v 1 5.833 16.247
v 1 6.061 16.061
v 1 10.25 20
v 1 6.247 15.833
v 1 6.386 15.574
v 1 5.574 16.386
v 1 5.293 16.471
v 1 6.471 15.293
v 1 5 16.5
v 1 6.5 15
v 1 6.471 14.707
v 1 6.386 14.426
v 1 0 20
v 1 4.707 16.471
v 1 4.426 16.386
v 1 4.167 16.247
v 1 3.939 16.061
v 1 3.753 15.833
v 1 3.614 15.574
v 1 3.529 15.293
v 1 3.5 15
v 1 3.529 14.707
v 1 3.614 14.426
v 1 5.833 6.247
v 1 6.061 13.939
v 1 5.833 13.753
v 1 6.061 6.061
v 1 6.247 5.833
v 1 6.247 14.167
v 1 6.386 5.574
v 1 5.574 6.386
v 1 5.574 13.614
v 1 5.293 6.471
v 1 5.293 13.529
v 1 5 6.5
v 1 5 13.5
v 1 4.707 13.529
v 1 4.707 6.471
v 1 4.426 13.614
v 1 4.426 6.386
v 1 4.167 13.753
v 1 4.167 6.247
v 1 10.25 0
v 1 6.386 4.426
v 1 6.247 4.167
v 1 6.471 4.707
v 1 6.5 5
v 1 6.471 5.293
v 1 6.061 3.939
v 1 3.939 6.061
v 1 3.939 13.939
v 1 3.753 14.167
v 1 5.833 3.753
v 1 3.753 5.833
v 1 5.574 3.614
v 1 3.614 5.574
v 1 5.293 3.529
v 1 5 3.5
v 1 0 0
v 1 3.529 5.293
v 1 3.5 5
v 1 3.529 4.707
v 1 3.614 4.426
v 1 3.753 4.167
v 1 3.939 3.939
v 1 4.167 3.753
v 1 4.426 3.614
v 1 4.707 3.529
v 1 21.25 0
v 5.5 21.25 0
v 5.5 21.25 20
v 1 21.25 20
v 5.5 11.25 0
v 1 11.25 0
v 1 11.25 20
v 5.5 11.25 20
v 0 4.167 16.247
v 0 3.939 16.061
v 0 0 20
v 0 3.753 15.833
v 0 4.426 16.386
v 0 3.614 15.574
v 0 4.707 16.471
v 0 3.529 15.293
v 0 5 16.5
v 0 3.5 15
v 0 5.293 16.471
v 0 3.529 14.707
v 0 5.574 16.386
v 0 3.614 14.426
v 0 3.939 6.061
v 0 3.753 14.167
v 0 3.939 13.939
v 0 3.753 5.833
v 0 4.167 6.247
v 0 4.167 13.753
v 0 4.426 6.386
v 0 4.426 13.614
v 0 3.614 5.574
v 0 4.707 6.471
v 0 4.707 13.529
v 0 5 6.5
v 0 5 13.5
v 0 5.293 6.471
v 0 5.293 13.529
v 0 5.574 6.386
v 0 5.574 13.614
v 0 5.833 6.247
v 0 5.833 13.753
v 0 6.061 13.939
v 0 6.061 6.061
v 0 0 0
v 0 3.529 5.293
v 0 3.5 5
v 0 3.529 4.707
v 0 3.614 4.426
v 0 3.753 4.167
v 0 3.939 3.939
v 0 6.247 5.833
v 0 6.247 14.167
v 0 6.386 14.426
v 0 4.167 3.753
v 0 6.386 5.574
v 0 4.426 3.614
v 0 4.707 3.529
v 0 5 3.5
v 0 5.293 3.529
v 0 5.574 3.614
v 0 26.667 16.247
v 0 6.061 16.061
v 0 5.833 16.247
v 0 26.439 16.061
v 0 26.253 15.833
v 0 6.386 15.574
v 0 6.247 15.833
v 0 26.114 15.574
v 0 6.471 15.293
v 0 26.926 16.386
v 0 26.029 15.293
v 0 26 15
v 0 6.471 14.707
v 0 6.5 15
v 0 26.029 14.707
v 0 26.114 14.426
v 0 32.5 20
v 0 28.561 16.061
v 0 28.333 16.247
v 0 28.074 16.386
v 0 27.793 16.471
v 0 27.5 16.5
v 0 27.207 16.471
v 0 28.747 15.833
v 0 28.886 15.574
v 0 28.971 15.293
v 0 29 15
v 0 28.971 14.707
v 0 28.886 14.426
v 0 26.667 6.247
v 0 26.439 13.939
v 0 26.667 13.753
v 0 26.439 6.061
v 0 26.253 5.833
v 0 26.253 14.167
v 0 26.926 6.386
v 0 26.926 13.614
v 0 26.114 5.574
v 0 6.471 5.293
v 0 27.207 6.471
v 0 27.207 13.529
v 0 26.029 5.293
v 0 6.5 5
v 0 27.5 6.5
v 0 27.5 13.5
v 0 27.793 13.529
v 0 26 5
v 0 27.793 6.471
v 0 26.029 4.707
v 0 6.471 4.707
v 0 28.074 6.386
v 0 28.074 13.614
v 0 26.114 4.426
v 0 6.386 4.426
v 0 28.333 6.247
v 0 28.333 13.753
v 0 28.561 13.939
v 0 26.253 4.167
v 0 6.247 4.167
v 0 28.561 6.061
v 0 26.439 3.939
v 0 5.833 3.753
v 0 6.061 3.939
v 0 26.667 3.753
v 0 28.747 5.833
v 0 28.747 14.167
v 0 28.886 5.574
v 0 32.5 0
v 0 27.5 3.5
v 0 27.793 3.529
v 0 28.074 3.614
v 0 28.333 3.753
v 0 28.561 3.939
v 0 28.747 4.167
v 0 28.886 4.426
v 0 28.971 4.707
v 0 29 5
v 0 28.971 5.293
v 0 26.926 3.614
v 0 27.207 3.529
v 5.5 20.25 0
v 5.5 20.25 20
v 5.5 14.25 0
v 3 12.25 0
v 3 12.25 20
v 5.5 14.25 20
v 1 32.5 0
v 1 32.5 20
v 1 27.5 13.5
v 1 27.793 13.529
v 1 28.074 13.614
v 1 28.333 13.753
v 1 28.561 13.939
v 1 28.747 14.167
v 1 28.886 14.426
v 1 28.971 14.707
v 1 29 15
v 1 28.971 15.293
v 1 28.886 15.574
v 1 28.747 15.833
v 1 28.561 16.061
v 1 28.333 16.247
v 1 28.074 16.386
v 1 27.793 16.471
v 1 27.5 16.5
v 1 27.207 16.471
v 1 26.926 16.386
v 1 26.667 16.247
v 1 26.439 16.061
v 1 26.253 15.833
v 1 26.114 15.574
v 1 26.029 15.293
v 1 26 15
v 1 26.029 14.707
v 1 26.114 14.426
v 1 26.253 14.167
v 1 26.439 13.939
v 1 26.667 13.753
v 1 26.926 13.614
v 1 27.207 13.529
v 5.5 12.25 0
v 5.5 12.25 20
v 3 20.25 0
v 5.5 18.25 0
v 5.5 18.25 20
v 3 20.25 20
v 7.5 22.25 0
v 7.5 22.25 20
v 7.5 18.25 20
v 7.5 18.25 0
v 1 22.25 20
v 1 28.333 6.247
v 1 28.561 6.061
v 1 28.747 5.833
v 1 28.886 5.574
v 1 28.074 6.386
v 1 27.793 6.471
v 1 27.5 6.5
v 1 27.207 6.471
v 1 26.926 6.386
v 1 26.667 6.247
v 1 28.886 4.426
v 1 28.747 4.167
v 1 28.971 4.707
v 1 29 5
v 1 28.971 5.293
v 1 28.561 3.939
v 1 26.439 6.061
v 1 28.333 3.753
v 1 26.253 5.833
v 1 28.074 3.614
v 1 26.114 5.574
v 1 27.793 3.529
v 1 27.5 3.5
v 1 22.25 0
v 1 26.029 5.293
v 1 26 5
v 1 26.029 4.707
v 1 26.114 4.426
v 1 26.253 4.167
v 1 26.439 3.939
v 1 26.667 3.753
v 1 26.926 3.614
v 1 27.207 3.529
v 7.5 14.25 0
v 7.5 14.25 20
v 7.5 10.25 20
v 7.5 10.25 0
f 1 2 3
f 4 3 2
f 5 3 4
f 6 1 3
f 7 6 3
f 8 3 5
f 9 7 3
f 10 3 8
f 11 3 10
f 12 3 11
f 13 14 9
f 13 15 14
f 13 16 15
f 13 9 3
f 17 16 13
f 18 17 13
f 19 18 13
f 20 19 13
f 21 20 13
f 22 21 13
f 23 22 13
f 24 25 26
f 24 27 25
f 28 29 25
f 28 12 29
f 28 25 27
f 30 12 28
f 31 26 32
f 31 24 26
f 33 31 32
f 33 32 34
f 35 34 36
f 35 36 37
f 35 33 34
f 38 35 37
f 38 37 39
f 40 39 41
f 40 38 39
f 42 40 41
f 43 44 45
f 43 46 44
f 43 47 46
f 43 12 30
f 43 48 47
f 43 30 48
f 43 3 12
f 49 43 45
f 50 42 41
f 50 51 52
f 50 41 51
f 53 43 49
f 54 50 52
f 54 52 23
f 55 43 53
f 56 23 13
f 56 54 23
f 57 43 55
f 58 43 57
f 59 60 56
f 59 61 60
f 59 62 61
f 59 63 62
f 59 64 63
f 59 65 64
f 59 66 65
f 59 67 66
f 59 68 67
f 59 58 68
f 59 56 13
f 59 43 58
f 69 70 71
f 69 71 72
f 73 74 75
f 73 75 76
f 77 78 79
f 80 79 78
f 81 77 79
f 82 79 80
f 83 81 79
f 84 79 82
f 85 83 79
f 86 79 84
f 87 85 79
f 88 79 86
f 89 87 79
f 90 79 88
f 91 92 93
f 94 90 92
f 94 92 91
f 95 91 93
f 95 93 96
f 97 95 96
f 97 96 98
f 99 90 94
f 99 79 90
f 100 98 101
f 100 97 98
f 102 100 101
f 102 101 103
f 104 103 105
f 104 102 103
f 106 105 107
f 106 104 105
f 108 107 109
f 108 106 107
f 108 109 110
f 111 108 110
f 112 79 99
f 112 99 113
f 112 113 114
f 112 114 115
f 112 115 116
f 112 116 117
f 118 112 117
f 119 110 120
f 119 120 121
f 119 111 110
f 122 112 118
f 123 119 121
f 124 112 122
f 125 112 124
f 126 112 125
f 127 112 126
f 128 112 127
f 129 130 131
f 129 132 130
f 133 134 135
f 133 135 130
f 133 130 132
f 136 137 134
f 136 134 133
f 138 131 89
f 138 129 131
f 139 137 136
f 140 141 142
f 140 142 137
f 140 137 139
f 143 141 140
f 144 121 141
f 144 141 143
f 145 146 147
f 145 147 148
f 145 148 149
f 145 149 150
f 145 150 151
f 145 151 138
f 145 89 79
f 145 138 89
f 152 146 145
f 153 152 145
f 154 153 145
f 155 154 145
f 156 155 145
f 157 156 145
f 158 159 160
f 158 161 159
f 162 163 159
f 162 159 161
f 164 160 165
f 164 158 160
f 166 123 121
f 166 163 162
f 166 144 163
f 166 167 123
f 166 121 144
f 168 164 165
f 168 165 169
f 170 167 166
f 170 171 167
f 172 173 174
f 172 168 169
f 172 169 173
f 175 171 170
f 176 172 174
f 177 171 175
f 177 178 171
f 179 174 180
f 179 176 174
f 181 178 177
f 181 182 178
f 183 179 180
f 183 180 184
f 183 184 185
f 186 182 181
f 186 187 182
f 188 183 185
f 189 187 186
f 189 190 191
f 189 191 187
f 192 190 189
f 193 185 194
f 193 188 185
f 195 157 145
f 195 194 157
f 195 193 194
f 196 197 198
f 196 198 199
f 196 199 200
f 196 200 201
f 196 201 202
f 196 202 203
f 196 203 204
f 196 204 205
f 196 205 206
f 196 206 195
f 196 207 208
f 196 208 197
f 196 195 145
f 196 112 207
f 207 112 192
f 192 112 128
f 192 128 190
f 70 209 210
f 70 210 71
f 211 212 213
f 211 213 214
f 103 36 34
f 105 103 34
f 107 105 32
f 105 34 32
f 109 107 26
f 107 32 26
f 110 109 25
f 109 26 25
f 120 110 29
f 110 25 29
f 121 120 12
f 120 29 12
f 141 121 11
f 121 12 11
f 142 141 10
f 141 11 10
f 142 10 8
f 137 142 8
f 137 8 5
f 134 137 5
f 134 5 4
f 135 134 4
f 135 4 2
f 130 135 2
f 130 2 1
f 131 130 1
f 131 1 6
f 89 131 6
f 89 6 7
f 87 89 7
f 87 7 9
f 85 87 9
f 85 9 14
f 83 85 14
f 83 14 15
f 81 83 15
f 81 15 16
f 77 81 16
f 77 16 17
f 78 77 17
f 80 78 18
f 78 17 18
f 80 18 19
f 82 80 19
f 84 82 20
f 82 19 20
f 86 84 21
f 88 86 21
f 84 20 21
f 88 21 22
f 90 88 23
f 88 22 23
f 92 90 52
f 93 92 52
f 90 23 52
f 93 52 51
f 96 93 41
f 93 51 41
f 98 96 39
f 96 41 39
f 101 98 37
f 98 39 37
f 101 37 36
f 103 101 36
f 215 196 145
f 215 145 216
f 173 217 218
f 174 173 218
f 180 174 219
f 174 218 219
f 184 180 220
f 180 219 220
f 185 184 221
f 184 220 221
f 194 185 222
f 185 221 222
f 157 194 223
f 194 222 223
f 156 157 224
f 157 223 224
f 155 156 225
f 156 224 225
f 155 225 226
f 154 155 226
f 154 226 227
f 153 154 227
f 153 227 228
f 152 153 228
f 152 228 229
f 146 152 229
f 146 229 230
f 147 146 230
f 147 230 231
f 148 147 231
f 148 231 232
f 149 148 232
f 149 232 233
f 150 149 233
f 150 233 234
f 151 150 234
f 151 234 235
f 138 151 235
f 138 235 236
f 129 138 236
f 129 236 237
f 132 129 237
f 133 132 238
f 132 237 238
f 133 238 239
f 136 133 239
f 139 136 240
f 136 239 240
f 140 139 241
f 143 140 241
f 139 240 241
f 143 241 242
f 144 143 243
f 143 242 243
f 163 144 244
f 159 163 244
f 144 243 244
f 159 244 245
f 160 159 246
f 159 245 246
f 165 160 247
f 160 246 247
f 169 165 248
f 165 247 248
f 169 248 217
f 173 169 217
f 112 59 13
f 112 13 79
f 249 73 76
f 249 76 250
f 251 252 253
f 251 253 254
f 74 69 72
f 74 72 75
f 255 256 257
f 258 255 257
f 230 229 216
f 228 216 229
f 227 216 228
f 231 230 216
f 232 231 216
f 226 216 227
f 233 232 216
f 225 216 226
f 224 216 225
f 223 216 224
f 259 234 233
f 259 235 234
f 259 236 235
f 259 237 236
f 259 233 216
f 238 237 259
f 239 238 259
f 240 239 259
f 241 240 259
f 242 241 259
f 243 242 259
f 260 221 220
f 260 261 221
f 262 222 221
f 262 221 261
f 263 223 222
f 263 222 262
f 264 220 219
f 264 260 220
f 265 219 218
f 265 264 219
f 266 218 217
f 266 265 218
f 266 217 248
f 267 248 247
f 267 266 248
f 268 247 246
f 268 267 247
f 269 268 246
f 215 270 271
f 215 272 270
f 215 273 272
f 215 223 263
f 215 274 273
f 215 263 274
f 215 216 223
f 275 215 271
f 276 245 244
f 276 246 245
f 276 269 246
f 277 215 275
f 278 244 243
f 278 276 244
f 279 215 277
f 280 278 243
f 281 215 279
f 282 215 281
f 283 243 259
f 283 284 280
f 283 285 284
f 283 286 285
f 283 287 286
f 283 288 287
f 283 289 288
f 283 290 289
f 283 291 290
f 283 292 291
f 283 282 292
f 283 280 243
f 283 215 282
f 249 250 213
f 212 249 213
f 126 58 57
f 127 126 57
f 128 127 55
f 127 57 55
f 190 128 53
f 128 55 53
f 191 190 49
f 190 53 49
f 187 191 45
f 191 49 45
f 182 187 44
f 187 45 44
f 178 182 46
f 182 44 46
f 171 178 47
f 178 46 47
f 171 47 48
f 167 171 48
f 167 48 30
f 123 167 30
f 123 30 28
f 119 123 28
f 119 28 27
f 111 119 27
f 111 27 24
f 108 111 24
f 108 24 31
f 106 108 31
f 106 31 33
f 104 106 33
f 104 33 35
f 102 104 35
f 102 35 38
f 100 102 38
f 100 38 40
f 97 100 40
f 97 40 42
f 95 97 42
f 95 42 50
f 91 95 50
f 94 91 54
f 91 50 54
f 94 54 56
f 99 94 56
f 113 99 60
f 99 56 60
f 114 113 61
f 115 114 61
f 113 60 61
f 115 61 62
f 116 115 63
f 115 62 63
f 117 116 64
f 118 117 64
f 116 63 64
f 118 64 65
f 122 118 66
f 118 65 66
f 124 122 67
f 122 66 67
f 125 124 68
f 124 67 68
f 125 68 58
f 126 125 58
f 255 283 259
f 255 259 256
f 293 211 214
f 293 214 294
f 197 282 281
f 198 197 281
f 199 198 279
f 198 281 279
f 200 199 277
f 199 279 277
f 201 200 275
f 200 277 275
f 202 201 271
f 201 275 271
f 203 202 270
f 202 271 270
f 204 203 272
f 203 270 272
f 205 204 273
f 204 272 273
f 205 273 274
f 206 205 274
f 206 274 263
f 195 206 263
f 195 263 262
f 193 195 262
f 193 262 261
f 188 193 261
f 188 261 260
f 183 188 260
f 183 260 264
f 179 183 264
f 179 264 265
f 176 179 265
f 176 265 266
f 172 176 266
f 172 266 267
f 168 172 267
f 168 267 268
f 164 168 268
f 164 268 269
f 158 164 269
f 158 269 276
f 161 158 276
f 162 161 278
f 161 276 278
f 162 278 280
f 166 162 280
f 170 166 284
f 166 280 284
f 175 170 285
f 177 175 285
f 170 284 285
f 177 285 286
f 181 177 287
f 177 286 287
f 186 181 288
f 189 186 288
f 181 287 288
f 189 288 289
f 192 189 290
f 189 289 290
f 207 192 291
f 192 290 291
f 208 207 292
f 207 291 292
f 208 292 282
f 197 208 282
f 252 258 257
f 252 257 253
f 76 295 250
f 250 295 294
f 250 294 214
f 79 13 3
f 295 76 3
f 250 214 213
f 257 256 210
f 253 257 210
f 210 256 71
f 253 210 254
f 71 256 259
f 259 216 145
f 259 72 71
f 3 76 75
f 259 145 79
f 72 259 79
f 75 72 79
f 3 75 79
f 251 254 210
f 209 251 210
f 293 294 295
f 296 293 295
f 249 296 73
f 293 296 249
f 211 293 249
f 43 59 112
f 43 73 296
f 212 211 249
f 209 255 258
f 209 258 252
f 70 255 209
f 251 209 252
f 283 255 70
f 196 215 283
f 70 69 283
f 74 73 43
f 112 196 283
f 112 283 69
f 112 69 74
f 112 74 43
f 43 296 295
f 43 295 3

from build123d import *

# Parameters (mm, degrees)
BOSS_EXTRU_1_DEPTH         = 20
ESQUISSE2_R                = 1.5
ENL_V_MAT_EXTRU_1_DEPTH    = 2
R_P_TITION_LIN_AIRE1_COUNT = 2
R_P_TITION_LIN_AIRE1_PITCH = 10


with BuildPart() as part:
    # Esquisse1 → Boss.-Extru.1 (new body)
    with BuildSketch(Plane.XY):
        Polygon((1, 32.5), (1, 22.25), (7.5, 22.25), (7.5, 18.25), (5.5, 18.25), (3, 20.25), (5.5, 20.25), (5.5, 21.25), (1, 21.25), (1, 11.25), (5.5, 11.25), (5.5, 12.25), (3, 12.25), (5.5, 14.25), (7.5, 14.25), (7.5, 10.25), (1, 10.25), (1, 0), (0, 0), (0, 32.5), align=None)
    extrude(amount=BOSS_EXTRU_1_DEPTH)

    # Esquisse2 → Enlèv. mat.-Extru.1 (cut, through all)
    with BuildSketch(Plane(origin=(1, 0, 0), x_dir=(0, 0, -1), z_dir=(1, 0, 0))):
        with Locations((-15, 27.5)):
            Circle(ESQUISSE2_R)
        with Locations((-15, 5)):
            Circle(ESQUISSE2_R)
    enl_v_mat_extru_1 = extrude(amount=-ENL_V_MAT_EXTRU_1_DEPTH, mode=Mode.SUBTRACT)

    # Répétition linéaire1: Enlèv. mat.-Extru.1 ×2
    with Locations(*[(0, 0, -i * R_P_TITION_LIN_AIRE1_PITCH) for i in range(1, R_P_TITION_LIN_AIRE1_COUNT)]):
        add(enl_v_mat_extru_1, mode=Mode.SUBTRACT)


solid = part.part
